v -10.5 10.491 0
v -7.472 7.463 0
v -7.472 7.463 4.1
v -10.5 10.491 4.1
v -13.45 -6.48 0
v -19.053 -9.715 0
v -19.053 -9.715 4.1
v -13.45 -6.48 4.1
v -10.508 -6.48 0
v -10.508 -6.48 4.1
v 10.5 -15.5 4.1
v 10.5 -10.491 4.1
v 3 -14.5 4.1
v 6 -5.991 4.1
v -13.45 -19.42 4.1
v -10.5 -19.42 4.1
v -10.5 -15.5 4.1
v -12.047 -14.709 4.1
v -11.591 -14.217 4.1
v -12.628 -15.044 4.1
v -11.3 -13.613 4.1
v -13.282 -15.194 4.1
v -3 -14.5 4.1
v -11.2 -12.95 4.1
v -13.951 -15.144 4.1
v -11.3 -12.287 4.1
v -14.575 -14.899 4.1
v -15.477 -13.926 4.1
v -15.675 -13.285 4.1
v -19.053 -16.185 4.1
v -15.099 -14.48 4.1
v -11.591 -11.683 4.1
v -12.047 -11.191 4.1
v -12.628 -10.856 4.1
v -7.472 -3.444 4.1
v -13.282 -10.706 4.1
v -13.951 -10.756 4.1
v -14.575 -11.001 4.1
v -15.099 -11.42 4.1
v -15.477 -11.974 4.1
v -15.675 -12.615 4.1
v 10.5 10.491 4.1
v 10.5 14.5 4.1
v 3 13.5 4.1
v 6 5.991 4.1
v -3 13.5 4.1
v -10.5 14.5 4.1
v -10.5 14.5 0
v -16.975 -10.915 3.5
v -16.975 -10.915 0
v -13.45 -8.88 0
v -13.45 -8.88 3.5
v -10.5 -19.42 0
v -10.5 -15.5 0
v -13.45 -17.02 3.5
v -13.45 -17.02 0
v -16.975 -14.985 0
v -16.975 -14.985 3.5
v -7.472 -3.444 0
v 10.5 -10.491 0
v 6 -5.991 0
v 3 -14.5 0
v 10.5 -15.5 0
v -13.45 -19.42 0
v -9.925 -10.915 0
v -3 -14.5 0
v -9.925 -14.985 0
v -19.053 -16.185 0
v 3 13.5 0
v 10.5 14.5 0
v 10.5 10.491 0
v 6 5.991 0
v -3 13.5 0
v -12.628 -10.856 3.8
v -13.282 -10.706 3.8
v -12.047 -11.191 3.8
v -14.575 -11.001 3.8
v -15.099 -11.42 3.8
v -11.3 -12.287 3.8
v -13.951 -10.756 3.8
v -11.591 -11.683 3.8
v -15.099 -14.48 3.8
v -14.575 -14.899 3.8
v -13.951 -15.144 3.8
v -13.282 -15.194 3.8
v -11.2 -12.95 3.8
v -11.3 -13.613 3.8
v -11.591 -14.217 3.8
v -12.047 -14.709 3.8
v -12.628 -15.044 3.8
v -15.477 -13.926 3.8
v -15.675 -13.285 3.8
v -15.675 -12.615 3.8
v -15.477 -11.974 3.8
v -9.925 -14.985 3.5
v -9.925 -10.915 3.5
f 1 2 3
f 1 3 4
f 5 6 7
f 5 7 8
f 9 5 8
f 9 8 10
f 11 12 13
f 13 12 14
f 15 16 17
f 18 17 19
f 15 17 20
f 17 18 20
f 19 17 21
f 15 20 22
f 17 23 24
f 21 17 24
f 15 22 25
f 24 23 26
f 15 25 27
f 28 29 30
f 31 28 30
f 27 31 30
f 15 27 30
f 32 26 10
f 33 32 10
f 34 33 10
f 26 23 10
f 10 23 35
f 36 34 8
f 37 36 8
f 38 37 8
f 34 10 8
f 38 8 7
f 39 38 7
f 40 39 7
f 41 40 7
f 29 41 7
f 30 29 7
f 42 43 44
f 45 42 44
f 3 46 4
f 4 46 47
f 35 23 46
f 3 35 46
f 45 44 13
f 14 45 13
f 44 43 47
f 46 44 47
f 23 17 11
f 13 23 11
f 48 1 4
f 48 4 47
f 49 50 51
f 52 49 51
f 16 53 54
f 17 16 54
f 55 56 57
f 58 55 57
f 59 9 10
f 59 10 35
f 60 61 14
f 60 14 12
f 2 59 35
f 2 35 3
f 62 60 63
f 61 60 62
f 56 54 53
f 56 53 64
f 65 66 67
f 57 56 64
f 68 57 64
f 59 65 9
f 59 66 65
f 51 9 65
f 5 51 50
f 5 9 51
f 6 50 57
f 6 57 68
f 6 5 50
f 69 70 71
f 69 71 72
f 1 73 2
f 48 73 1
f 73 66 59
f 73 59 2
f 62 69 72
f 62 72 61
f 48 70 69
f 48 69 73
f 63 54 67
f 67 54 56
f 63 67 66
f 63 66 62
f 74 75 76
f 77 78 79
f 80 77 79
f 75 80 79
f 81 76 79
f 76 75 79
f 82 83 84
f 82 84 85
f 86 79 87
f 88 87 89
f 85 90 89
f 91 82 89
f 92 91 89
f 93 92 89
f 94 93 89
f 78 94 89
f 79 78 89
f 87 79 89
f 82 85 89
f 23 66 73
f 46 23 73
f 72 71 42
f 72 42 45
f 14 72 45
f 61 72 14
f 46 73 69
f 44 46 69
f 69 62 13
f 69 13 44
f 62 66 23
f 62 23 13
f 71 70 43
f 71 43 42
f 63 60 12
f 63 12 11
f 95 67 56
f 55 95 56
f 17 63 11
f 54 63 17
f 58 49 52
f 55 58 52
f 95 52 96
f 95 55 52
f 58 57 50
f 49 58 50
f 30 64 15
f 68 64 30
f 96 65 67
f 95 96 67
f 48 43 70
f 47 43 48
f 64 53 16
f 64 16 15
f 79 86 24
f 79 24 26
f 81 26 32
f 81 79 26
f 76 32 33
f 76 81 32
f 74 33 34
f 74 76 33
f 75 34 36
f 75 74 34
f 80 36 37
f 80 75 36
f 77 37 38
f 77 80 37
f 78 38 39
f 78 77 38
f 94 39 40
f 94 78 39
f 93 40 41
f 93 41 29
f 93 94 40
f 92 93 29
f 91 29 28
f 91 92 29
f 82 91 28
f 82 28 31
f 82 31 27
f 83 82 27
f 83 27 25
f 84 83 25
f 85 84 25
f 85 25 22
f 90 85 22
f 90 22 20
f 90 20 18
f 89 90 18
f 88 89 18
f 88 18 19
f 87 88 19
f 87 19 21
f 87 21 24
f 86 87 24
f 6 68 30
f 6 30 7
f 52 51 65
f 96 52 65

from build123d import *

# Parameters (mm, degrees)
SKETCH_R        = 2.25
SKETCH_W        = 6
SKETCH_H        = 28
PAD_DEPTH       = 4.1
POCKET_DEPTH    = 3.5
SKETCH003_W     = 21
SKETCH003_H     = 4.1
POCKET001_DEPTH = 1
SKETCH002_R     = 2.25
PAD001_DEPTH    = 0.3


with BuildPart() as part:
    # Sketch → Pad (new body)
    with BuildSketch(Plane.XY):
        Polygon((-10.5, 15.5), (10.5, 15.5), (10.5, 10.491002), (6, 5.991002), (6, -5.991002), (10.5, -10.491002), (10.5, -15.5), (-10.5, -15.5), (-10.5, -17.717136), (-10.5, -19.420319), (-13.45, -19.420319), (-19.053461, -16.18516), (-19.053461, -9.71484), (-13.45, -6.479681), (-10.508209, -6.479681), (-7.472105, -3.443576), (-7.472105, 7.463107), (-10.5, 10.491002), align=None)
        with Locations((-13.45, -12.95)):
            Circle(SKETCH_R, mode=Mode.SUBTRACT)
        with Locations((0, -0.5)):
            Rectangle(SKETCH_W, SKETCH_H, mode=Mode.SUBTRACT)
    extrude(amount=PAD_DEPTH)

    # Sketch001 → Pocket (cut)
    with BuildSketch(Plane(origin=(0, 0, 0), x_dir=(1, 0, 0), z_dir=(0, 0, -1))):
        Polygon((-13.45, 8.879681), (-9.925, 10.91484), (-9.925, 14.98516), (-13.45, 17.020319), (-16.975, 14.98516), (-16.975, 10.91484), align=None)
    extrude(amount=-POCKET_DEPTH, mode=Mode.SUBTRACT)

    # Sketch003 → Pocket001 (cut)
    with BuildSketch(Plane(origin=(0, 15.5, 0), x_dir=(-1, 0, 0), z_dir=(0, 1, 0))):
        with Locations((0, 2.05)):
            Rectangle(SKETCH003_W, SKETCH003_H)
    extrude(amount=-POCKET001_DEPTH, mode=Mode.SUBTRACT)

    # Sketch002 → Pad001 (new body)
    with BuildSketch(Plane(origin=(0, 0, 3.5), x_dir=(1, 0, 0), z_dir=(0, 0, -1))):
        with Locations((-13.45, 12.95)):
            Circle(SKETCH002_R)
    extrude(amount=-PAD001_DEPTH)


solid = part.part
